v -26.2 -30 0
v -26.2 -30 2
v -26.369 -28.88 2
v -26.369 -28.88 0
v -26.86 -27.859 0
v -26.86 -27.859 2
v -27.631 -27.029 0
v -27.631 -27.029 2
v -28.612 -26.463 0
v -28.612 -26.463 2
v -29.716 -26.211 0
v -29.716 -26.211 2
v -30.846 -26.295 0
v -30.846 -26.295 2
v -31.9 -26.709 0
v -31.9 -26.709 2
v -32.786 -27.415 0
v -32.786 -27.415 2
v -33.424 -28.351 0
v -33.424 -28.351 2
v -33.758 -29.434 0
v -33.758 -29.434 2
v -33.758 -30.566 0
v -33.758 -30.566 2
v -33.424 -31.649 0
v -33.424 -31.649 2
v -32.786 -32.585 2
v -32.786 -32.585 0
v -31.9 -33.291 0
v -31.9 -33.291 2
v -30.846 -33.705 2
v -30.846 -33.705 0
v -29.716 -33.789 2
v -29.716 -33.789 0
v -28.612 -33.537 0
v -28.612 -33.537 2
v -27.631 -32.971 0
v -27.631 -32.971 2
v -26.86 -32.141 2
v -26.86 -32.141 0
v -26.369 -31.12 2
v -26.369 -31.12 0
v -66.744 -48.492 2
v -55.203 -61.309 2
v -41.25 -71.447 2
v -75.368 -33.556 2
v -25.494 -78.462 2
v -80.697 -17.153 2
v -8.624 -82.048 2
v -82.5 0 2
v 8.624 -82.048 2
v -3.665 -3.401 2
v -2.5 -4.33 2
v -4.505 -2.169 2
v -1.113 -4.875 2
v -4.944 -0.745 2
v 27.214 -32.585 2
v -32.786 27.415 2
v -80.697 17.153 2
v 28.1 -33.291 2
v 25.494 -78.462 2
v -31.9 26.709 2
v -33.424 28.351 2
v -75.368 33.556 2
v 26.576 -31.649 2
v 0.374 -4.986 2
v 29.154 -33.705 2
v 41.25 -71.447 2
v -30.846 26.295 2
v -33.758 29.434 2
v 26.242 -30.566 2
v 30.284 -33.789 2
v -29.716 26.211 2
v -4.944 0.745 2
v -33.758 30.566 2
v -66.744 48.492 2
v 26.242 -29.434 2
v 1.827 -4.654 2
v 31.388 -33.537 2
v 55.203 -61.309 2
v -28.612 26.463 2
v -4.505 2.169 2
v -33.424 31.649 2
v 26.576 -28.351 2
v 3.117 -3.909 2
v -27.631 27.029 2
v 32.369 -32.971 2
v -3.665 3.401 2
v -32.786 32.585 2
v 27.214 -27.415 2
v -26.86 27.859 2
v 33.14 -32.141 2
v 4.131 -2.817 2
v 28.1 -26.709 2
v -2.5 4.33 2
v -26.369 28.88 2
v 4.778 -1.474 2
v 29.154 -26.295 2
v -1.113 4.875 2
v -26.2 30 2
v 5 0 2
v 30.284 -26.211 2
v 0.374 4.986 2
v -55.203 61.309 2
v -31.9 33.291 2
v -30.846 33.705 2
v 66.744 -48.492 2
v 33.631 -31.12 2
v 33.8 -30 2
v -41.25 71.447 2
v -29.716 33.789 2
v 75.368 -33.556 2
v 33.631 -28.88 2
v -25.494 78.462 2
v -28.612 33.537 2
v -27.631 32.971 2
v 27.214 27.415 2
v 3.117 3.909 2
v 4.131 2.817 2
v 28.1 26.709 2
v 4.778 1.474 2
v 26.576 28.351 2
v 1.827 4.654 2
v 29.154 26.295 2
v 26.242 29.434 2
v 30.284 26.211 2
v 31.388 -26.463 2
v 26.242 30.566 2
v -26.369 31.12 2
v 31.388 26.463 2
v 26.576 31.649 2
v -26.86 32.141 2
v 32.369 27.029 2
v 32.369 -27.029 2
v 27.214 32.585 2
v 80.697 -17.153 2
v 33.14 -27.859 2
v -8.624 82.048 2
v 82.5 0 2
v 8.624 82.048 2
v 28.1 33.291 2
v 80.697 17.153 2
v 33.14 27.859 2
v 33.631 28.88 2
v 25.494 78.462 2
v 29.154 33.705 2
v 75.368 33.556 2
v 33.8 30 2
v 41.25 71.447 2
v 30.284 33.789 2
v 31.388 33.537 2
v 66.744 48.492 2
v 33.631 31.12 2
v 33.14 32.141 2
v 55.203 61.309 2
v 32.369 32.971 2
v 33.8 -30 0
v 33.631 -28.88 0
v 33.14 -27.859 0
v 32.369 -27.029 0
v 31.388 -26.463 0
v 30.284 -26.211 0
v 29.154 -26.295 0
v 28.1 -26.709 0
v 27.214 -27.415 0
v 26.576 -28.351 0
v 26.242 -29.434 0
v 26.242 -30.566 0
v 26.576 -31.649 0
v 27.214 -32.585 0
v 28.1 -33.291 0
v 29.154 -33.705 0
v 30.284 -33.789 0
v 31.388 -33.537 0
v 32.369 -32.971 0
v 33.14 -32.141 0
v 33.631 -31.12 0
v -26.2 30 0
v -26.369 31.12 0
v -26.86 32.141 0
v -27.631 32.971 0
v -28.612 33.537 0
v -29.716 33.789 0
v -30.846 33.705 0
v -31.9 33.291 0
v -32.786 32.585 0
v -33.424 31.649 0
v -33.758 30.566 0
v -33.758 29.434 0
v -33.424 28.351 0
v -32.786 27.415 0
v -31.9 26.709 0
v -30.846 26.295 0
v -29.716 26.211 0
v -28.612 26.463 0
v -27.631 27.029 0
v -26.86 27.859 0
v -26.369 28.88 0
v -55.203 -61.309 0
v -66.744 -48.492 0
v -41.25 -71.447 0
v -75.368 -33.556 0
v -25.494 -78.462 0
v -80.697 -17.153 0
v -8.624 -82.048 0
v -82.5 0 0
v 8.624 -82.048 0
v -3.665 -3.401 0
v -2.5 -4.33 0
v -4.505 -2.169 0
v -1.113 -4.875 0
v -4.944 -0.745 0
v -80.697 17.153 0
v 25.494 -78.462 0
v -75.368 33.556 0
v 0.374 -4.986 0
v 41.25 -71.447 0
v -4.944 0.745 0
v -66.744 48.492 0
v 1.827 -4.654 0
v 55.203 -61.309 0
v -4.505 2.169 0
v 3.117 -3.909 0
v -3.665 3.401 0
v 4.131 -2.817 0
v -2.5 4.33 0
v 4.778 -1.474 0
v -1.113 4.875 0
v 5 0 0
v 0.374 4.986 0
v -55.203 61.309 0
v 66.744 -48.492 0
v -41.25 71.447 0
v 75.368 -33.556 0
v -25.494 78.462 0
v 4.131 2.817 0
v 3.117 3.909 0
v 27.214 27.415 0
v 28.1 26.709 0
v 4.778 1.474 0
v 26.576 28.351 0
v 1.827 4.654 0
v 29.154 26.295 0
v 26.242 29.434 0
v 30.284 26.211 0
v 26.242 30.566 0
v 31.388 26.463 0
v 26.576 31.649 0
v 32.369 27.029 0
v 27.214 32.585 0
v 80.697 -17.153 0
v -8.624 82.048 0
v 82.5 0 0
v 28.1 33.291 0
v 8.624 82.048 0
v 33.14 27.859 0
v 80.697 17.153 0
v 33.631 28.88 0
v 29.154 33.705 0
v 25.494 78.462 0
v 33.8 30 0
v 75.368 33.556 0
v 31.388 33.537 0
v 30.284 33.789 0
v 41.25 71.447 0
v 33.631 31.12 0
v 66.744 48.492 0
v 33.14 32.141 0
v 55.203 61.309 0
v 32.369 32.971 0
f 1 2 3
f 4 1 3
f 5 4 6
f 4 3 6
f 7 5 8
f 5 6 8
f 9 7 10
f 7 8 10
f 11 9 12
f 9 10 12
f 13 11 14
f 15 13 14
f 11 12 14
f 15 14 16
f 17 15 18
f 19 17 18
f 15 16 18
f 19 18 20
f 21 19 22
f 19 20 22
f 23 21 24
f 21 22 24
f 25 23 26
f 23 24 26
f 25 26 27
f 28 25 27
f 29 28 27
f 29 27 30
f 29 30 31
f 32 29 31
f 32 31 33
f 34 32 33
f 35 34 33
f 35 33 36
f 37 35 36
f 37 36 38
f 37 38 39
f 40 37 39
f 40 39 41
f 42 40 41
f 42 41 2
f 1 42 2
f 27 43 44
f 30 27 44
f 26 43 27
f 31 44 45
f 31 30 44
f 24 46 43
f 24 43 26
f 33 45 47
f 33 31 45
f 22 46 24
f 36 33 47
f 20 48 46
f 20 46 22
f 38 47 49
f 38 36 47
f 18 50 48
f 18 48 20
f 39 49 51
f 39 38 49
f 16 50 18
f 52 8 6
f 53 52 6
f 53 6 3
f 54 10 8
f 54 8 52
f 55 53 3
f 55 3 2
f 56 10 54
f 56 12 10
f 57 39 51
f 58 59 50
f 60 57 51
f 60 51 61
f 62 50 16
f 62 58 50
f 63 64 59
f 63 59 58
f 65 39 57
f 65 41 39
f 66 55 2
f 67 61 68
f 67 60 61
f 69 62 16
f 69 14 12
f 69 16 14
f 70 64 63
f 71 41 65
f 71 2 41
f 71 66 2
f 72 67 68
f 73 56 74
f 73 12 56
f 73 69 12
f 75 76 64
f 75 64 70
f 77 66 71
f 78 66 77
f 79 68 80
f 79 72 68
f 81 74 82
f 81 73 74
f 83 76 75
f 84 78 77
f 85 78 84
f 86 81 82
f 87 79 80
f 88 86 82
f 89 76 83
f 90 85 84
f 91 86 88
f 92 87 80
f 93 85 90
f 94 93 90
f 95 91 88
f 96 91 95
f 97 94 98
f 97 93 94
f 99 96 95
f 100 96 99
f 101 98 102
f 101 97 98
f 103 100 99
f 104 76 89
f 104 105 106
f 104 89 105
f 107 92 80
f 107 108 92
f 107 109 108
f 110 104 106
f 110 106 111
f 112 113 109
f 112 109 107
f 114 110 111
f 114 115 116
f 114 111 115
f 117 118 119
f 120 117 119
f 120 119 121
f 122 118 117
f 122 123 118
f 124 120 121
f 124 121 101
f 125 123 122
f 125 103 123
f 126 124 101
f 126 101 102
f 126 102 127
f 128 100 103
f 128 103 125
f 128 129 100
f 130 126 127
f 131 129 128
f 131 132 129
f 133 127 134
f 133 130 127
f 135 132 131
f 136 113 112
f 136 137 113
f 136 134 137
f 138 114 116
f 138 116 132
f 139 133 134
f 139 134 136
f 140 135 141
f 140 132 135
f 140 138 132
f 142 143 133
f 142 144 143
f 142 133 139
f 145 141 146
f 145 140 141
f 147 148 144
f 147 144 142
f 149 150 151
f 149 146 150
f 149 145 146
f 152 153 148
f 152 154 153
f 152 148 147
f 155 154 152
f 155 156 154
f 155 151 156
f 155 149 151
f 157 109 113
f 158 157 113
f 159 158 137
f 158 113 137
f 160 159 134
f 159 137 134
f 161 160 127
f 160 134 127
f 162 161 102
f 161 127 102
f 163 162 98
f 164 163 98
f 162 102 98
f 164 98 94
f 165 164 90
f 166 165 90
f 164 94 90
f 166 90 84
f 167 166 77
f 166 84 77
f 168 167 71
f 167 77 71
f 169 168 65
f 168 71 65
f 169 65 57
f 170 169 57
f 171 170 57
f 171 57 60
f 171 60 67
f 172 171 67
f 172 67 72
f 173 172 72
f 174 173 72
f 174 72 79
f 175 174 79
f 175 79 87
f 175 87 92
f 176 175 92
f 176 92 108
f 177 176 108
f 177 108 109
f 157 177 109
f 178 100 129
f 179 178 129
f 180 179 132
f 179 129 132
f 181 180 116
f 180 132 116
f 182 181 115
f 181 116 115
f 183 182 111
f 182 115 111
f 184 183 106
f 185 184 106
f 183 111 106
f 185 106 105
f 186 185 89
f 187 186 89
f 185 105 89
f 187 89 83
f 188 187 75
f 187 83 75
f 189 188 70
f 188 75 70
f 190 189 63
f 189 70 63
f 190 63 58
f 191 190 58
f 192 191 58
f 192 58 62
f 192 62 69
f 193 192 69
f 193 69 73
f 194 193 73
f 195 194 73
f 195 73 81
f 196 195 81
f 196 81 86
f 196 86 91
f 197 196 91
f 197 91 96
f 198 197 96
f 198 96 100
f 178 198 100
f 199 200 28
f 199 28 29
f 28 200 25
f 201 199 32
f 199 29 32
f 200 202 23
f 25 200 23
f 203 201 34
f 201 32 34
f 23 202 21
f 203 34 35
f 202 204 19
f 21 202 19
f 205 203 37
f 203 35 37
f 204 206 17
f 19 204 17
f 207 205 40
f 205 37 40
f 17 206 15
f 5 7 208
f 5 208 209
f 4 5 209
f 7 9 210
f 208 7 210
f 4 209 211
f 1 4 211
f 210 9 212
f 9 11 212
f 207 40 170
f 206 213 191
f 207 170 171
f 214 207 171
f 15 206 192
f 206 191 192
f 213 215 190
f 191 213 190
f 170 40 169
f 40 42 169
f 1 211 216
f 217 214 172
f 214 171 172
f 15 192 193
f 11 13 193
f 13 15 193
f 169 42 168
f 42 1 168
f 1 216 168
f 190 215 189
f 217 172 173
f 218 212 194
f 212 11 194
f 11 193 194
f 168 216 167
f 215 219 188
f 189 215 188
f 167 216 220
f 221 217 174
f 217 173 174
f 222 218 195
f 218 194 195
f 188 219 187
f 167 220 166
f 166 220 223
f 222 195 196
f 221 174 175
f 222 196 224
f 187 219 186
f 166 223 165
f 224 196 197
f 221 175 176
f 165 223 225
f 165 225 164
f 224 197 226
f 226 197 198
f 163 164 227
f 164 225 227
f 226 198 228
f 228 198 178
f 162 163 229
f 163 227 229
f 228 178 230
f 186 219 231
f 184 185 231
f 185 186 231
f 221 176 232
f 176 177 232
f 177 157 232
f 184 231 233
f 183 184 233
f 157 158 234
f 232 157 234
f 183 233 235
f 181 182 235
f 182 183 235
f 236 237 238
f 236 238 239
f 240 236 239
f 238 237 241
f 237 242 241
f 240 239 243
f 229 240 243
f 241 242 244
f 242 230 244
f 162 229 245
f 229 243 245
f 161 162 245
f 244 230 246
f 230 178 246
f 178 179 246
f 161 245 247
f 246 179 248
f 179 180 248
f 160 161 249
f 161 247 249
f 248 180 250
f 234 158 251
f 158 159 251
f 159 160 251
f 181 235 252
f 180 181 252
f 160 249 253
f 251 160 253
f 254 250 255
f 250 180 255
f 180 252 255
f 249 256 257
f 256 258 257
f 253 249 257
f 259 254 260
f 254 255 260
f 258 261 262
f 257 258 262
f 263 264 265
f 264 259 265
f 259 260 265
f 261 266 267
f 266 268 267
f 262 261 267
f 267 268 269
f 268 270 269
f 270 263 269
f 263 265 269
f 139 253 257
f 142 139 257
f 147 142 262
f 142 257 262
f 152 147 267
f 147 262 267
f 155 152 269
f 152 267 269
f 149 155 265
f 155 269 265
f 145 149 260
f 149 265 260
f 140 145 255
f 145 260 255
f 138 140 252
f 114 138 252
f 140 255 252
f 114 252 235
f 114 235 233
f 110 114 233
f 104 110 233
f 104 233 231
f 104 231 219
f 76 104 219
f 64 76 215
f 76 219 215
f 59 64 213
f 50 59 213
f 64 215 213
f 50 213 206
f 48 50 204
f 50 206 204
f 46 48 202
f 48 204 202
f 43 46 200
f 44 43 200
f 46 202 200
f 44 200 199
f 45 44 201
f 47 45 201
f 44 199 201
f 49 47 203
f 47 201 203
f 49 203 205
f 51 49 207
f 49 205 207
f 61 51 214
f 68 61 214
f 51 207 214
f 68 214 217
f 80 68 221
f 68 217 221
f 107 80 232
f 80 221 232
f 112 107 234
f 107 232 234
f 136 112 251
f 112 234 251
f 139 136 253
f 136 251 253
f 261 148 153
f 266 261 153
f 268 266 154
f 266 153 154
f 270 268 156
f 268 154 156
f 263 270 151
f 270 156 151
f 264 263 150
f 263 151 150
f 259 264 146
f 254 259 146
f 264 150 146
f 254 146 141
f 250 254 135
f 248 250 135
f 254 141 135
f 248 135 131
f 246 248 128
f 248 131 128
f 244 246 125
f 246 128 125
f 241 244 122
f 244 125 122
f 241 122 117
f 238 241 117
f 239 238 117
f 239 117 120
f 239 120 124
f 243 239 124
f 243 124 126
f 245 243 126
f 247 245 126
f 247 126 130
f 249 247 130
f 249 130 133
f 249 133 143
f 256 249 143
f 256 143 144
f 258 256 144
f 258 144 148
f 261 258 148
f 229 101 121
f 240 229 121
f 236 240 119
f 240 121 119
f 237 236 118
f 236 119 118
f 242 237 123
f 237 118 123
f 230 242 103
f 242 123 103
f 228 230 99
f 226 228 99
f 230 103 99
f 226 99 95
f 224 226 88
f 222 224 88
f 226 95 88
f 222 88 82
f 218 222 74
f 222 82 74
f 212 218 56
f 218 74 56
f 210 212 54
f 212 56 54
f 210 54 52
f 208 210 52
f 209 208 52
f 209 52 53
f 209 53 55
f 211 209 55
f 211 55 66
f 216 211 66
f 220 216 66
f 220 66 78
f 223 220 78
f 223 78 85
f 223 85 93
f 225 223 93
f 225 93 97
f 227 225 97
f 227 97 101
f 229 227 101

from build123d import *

# Parameters (mm, degrees)
SKETCH_1_R          = 82.5
EXTRUDE_1_DEPTH     = 2
SKETCH_2_R          = 3.8
SKETCH_2_R_2        = 5
CUT_EXTRUDE_1_DEPTH = 117.689759619


with BuildPart() as part:
    # 草图1 → 凸台-拉伸1 (new body)
    with BuildSketch(Plane.XY):
        Circle(SKETCH_1_R)
    extrude(amount=EXTRUDE_1_DEPTH)

    # 草图2 → 切除-拉伸1 (cut, through all)
    with BuildSketch(Plane.XY.offset(2)):
        with Locations((30, 30)):
            Circle(SKETCH_2_R)
        with Locations((-30, 30)):
            Circle(SKETCH_2_R)
        with Locations((-30, -30)):
            Circle(SKETCH_2_R)
        with Locations((30, -30)):
            Circle(SKETCH_2_R)
        Circle(SKETCH_2_R_2)
    extrude(amount=-CUT_EXTRUDE_1_DEPTH, mode=Mode.SUBTRACT)


solid = part.part
